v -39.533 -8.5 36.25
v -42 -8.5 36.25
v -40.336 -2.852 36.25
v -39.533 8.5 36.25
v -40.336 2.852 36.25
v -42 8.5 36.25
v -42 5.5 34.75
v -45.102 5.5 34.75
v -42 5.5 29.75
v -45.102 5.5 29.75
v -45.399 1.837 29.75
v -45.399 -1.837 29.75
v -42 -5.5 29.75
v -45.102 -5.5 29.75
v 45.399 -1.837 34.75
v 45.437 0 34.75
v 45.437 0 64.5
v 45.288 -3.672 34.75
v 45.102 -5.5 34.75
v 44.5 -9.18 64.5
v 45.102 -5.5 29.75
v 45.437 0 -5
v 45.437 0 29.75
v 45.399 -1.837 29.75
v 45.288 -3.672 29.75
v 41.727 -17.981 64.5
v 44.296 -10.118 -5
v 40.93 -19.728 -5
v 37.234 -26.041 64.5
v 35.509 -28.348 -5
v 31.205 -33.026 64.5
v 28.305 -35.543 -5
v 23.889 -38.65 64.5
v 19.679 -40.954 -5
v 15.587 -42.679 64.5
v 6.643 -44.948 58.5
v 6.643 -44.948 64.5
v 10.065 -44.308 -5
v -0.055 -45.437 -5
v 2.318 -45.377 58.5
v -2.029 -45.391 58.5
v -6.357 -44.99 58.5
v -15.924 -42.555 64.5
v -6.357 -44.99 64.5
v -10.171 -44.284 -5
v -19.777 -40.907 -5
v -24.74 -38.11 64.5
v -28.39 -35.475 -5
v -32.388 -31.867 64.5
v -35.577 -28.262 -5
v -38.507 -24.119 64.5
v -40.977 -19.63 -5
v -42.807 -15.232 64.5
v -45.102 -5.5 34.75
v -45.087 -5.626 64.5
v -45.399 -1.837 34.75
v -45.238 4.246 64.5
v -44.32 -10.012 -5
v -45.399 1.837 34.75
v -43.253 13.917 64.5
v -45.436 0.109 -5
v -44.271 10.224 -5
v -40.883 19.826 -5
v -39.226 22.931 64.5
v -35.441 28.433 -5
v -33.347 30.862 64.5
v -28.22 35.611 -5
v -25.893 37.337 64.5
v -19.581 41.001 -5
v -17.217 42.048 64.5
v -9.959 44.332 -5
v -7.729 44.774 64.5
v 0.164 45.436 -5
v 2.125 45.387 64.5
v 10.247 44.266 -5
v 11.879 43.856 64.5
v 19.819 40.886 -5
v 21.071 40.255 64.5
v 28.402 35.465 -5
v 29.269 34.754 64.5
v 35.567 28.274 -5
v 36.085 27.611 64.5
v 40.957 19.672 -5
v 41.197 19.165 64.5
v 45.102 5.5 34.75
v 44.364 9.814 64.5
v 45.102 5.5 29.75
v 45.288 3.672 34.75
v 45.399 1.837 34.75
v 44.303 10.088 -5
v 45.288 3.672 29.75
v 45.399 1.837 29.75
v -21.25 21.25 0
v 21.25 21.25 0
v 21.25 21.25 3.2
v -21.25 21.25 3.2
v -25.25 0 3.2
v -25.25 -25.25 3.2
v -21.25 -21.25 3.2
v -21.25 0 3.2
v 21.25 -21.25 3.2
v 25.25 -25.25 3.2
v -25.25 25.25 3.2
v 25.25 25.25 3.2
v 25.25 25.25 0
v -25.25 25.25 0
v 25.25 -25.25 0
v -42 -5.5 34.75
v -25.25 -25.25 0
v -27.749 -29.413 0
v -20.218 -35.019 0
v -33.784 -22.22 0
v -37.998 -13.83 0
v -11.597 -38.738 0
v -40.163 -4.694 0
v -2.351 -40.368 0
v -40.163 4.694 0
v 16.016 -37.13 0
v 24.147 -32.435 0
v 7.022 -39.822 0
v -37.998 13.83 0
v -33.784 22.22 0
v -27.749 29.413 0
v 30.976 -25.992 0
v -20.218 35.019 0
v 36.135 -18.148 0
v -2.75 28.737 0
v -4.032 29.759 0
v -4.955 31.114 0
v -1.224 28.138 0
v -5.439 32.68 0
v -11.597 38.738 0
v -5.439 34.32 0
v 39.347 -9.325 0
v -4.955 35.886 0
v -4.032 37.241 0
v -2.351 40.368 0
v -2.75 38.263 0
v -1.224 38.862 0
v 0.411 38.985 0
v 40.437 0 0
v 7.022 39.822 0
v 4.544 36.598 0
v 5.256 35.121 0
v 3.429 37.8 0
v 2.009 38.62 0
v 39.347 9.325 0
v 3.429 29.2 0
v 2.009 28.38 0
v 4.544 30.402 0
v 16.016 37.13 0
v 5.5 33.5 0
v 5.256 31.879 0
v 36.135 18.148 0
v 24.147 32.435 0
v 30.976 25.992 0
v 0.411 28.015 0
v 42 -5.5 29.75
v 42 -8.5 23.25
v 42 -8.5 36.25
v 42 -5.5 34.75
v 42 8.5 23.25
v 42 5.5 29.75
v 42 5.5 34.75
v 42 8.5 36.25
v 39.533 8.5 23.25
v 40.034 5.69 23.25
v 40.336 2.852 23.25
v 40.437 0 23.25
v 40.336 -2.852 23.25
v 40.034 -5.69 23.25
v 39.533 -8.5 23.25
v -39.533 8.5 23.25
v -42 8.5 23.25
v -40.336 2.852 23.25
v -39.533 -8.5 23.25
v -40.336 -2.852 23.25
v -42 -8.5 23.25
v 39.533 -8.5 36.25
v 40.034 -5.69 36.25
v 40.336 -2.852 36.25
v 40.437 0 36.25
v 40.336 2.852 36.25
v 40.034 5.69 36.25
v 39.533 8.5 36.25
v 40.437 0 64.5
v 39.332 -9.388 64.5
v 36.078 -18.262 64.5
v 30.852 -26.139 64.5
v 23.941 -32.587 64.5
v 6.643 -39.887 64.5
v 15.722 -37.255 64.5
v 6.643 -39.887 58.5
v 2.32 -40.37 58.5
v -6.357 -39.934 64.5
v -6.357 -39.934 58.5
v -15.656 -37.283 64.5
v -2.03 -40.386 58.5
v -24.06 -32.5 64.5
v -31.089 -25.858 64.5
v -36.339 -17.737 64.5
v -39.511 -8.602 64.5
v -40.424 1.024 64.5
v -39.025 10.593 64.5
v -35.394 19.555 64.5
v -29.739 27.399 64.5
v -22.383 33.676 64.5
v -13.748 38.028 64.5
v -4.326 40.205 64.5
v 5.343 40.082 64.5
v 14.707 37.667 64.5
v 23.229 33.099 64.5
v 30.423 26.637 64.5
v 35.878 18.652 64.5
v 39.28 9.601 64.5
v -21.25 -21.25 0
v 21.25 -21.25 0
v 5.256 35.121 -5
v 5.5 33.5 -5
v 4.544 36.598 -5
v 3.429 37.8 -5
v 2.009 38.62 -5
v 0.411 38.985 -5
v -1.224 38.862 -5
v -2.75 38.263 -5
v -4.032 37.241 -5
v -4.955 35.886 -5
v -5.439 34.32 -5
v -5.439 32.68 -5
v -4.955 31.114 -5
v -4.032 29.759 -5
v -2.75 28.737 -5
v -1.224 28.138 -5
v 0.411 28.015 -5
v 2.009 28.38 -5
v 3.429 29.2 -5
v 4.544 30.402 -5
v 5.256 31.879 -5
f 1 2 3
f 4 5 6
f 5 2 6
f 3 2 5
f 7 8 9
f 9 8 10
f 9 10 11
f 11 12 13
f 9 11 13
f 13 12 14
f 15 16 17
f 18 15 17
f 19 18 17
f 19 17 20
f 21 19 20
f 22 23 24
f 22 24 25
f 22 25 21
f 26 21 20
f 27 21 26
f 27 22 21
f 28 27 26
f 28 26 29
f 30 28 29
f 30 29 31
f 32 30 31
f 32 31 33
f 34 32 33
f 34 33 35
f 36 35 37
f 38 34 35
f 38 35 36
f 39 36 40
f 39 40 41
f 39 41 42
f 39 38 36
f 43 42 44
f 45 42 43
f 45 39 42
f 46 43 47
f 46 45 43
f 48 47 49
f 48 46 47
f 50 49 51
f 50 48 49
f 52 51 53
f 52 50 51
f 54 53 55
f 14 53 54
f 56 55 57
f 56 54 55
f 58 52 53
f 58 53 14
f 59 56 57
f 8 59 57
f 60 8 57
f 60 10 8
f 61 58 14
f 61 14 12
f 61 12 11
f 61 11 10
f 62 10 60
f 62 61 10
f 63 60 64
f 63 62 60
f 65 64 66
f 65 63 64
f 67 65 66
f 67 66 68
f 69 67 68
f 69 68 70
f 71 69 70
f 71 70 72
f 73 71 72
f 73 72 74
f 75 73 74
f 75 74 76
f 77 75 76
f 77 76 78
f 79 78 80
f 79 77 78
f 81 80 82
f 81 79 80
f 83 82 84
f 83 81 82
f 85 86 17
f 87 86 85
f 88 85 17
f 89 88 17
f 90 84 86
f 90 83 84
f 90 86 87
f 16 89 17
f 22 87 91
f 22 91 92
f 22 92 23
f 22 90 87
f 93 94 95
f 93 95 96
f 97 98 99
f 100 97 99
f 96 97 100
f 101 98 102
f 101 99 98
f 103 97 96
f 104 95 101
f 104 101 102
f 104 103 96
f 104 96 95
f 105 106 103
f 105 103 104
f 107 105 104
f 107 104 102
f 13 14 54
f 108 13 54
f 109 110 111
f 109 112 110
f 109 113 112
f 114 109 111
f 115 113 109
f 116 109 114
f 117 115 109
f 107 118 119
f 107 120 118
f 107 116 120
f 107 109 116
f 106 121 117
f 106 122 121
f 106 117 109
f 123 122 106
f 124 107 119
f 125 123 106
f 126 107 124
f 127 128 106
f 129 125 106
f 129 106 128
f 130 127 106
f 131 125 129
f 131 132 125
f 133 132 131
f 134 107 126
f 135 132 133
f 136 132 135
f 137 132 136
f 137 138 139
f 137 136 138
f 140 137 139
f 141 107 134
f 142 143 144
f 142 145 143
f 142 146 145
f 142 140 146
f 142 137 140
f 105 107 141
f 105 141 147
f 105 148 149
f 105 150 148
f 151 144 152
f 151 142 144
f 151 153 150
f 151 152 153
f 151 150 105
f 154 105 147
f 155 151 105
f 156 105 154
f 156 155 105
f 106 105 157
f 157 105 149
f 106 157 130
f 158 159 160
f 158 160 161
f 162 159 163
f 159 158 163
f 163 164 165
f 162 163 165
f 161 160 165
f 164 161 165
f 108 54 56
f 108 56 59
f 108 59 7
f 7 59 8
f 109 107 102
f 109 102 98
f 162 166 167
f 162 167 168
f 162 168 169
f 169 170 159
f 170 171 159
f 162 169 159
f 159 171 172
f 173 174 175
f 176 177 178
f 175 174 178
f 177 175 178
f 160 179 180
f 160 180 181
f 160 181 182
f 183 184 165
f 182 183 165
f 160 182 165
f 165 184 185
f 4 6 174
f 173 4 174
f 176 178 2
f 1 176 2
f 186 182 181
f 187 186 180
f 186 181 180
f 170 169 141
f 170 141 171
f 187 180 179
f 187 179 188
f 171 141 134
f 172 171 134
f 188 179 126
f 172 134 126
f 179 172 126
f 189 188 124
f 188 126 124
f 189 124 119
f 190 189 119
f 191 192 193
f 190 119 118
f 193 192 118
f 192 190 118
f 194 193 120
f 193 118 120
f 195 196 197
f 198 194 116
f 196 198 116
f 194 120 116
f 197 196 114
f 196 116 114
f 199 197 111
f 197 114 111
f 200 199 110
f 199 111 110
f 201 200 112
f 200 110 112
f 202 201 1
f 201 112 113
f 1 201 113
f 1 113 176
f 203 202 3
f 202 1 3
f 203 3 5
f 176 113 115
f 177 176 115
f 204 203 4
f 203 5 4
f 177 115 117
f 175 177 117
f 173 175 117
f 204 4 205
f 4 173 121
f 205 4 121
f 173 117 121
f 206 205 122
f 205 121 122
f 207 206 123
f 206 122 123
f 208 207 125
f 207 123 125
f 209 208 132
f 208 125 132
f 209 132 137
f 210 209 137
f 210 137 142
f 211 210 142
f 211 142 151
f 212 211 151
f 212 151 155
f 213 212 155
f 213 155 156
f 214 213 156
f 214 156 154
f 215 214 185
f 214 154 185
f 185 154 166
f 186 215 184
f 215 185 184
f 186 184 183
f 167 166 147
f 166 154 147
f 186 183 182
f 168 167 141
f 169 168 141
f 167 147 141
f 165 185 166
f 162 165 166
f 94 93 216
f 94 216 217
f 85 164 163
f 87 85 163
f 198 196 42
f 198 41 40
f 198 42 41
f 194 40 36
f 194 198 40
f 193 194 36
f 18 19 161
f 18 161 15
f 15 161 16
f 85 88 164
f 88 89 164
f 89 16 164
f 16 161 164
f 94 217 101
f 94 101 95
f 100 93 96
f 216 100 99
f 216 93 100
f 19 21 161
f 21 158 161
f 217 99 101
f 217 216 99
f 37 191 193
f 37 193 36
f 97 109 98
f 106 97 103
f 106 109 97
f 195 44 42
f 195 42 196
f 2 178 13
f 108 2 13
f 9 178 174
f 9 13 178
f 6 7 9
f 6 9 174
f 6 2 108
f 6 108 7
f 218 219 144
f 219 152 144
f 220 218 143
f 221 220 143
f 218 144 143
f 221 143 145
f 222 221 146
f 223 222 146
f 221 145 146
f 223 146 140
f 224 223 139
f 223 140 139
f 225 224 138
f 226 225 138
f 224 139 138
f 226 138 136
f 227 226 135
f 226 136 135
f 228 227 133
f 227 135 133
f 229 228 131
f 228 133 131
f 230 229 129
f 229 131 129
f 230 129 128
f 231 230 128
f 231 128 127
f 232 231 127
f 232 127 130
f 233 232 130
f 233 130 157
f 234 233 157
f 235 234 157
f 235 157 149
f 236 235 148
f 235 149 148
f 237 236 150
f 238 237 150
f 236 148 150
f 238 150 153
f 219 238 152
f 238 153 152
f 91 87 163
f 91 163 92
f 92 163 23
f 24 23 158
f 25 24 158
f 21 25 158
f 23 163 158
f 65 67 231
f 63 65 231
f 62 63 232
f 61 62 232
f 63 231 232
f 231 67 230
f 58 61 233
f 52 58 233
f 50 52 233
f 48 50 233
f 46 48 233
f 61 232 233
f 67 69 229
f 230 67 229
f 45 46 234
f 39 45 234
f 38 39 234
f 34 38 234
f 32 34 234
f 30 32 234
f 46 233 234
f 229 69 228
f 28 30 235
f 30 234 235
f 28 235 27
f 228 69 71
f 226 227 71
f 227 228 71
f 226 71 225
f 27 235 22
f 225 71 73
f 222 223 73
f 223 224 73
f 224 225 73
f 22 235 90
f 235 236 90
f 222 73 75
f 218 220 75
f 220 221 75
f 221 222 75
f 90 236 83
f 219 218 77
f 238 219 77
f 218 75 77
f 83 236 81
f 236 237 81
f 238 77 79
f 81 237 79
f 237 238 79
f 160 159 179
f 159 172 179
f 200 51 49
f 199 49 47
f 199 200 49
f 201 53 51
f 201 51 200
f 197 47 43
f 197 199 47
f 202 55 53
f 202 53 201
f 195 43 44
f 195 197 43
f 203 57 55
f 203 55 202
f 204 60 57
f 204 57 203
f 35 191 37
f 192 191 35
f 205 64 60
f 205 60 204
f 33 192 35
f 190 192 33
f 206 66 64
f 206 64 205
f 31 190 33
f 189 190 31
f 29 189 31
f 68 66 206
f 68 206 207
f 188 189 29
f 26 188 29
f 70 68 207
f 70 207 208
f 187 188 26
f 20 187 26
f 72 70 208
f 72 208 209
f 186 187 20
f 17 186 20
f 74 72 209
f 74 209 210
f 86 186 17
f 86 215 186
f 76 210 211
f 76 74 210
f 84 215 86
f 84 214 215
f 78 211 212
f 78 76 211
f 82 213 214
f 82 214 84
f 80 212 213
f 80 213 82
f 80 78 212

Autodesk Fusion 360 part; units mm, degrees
sketch "Sketch1" plane through (0, 0, 0) normal (0, 0, 1) x (1, 0, 0)
  line L0 (21.25, 21.25) -> (-21.25, 21.25)
  line L1 (-21.25, 21.25) -> (-21.25, -21.25)
  line L2 (-21.25, -21.25) -> (21.25, -21.25)
  line L3 (21.25, -21.25) -> (21.25, 21.25)
  line L4 (21.25, 21.25) -> (-21.25, -21.25) construction
  line L5 (-21.25, 21.25) -> (21.25, -21.25) construction
  line L6 (25.25, -25.25) -> (-25.25, -25.25)
  line L7 (-25.25, -25.25) -> (-25.25, 25.25)
  line L8 (-25.25, 25.25) -> (25.25, 25.25)
  line L9 (25.25, 25.25) -> (25.25, -25.25)
  line L10 (25.25, -25.25) -> (-25.25, 25.25) construction
  line L11 (-25.25, -25.25) -> (25.25, 25.25) construction
  line L12 (-21.25, 0) -> (-25.25, 0)
  dimension "d2" = 42.5
  dimension "d3" = 42.5
  dimension "d4" = 4
extrude "Extrude1" add sketch "Sketch1" along normal blind 3.2
sketch "Sketch2" plane through (0, 0, 0) normal (0, 0, 1) x (1, 0, 0)
  circle A0 centre (0, 0) radius 40.4366
  circle A1 centre (0, 0) radius 45.4366
  line L0 (0.1635, 40.4363) -> (0.1635, 45.4363)
  dimension "d7" = 5
extrude "Extrude2" add sketch "Sketch2" against normal blind 5 contours A0 | A1
sketch "Sketch3" plane through (0, 0, 0) normal (0, 0, 1) x (1, 0, 0)
sketch "Sketch4" plane through (0, 0, 0) normal (0, 0, 1) x (1, 0, 0)
  line L0 (25.25, 25.25) -> (25.25, -25.25)
  line L1 (25.25, -25.25) -> (-25.25, -25.25)
  line L2 (-25.25, -25.25) -> (-25.25, 25.25)
  line L3 (-25.25, 25.25) -> (25.25, 25.25)
  circle A0 centre (0, 0) radius 45.4366
  circle A1 centre (0, 33.5) radius 5.5
extrude "Extrude3" cut sketch "Sketch4" against normal blind 10 contours A1
sketch "Sketch5" plane through (0, 0, 0) normal (0, 0, 1) x (1, 0, 0)
extrude "Extrude4" add sketch "Sketch2" along normal blind 64.5
sketch "Sketch6" plane through (0, 0, 0) normal (0, 0, 1) x (1, 0, 0)
  point P0 (-45.4366, 0)
ref_plane "WorkPlane1" through (0, 0, 64.5) normal (0, 0, 1) x (1, 0, 0)
sketch "Sketch7" plane through (0, 0, 64.5) normal (0, 0, 1) x (1, 0, 0)
  line L0 (-6.3568, -39.7886) -> (6.6432, -39.7886)
  line L1 (6.6432, -39.7886) -> (6.6432, -45.6886)
  line L2 (6.6432, -45.6886) -> (-6.3568, -45.6886)
  line L3 (-6.3568, -45.6886) -> (-6.3568, -39.7886)
  dimension "d15" = 5.9
  dimension "d16" = 13
extrude "Extrude5" cut sketch "Sketch7" against normal blind 6
sketch "Sketch8" plane through (0, 0, 0) normal (1, 0, 0) x (0, 1, 0)
  line L0 (-45.4366, 58.5) -> (-45.4366, -5)
  line L1 (45.4366, -5) -> (45.4366, 64.5)
  line L2 (0, 64.5) -> (0, -5) construction
  line L3 (-5.5, 34.75) -> (5.5, 34.75)
  line L4 (5.5, 34.75) -> (5.5, 29.75)
  line L5 (5.5, 29.75) -> (-5.5, 29.75)
  line L6 (-5.5, 29.75) -> (-5.5, 34.75)
  line L7 (45.4366, 64.5) -> (-44.9897, 64.5)
  line L8 (-45.4366, -5) -> (45.4366, -5)
  dimension "d19" = 11
  dimension "d20" = 5
extrude "Extrude6" cut sketch "Sketch8" along normal mid plane 200
sketch "Sketch9" plane through (0, 0, 0) normal (1, 0, 0) x (0, 1, 0)
  line L0 (-8.5, 36.25) -> (8.5, 36.25)
  line L1 (8.5, 36.25) -> (8.5, 23.25)
  line L2 (8.5, 23.25) -> (-8.5, 23.25)
  line L3 (-8.5, 23.25) -> (-8.5, 36.25)
  line L4 (0, 64.5) -> (0, -5)
  line L5 (-45.4366, -5) -> (45.4366, -5)
  line L6 (45.4366, 64.5) -> (-44.9897, 64.5)
  line L7 (0, 36.25) -> (0, 23.25)
  dimension "d23" = 17
  dimension "d24" = 13
extrude "Extrude7" cut sketch "Sketch9" along normal mid plane 84
